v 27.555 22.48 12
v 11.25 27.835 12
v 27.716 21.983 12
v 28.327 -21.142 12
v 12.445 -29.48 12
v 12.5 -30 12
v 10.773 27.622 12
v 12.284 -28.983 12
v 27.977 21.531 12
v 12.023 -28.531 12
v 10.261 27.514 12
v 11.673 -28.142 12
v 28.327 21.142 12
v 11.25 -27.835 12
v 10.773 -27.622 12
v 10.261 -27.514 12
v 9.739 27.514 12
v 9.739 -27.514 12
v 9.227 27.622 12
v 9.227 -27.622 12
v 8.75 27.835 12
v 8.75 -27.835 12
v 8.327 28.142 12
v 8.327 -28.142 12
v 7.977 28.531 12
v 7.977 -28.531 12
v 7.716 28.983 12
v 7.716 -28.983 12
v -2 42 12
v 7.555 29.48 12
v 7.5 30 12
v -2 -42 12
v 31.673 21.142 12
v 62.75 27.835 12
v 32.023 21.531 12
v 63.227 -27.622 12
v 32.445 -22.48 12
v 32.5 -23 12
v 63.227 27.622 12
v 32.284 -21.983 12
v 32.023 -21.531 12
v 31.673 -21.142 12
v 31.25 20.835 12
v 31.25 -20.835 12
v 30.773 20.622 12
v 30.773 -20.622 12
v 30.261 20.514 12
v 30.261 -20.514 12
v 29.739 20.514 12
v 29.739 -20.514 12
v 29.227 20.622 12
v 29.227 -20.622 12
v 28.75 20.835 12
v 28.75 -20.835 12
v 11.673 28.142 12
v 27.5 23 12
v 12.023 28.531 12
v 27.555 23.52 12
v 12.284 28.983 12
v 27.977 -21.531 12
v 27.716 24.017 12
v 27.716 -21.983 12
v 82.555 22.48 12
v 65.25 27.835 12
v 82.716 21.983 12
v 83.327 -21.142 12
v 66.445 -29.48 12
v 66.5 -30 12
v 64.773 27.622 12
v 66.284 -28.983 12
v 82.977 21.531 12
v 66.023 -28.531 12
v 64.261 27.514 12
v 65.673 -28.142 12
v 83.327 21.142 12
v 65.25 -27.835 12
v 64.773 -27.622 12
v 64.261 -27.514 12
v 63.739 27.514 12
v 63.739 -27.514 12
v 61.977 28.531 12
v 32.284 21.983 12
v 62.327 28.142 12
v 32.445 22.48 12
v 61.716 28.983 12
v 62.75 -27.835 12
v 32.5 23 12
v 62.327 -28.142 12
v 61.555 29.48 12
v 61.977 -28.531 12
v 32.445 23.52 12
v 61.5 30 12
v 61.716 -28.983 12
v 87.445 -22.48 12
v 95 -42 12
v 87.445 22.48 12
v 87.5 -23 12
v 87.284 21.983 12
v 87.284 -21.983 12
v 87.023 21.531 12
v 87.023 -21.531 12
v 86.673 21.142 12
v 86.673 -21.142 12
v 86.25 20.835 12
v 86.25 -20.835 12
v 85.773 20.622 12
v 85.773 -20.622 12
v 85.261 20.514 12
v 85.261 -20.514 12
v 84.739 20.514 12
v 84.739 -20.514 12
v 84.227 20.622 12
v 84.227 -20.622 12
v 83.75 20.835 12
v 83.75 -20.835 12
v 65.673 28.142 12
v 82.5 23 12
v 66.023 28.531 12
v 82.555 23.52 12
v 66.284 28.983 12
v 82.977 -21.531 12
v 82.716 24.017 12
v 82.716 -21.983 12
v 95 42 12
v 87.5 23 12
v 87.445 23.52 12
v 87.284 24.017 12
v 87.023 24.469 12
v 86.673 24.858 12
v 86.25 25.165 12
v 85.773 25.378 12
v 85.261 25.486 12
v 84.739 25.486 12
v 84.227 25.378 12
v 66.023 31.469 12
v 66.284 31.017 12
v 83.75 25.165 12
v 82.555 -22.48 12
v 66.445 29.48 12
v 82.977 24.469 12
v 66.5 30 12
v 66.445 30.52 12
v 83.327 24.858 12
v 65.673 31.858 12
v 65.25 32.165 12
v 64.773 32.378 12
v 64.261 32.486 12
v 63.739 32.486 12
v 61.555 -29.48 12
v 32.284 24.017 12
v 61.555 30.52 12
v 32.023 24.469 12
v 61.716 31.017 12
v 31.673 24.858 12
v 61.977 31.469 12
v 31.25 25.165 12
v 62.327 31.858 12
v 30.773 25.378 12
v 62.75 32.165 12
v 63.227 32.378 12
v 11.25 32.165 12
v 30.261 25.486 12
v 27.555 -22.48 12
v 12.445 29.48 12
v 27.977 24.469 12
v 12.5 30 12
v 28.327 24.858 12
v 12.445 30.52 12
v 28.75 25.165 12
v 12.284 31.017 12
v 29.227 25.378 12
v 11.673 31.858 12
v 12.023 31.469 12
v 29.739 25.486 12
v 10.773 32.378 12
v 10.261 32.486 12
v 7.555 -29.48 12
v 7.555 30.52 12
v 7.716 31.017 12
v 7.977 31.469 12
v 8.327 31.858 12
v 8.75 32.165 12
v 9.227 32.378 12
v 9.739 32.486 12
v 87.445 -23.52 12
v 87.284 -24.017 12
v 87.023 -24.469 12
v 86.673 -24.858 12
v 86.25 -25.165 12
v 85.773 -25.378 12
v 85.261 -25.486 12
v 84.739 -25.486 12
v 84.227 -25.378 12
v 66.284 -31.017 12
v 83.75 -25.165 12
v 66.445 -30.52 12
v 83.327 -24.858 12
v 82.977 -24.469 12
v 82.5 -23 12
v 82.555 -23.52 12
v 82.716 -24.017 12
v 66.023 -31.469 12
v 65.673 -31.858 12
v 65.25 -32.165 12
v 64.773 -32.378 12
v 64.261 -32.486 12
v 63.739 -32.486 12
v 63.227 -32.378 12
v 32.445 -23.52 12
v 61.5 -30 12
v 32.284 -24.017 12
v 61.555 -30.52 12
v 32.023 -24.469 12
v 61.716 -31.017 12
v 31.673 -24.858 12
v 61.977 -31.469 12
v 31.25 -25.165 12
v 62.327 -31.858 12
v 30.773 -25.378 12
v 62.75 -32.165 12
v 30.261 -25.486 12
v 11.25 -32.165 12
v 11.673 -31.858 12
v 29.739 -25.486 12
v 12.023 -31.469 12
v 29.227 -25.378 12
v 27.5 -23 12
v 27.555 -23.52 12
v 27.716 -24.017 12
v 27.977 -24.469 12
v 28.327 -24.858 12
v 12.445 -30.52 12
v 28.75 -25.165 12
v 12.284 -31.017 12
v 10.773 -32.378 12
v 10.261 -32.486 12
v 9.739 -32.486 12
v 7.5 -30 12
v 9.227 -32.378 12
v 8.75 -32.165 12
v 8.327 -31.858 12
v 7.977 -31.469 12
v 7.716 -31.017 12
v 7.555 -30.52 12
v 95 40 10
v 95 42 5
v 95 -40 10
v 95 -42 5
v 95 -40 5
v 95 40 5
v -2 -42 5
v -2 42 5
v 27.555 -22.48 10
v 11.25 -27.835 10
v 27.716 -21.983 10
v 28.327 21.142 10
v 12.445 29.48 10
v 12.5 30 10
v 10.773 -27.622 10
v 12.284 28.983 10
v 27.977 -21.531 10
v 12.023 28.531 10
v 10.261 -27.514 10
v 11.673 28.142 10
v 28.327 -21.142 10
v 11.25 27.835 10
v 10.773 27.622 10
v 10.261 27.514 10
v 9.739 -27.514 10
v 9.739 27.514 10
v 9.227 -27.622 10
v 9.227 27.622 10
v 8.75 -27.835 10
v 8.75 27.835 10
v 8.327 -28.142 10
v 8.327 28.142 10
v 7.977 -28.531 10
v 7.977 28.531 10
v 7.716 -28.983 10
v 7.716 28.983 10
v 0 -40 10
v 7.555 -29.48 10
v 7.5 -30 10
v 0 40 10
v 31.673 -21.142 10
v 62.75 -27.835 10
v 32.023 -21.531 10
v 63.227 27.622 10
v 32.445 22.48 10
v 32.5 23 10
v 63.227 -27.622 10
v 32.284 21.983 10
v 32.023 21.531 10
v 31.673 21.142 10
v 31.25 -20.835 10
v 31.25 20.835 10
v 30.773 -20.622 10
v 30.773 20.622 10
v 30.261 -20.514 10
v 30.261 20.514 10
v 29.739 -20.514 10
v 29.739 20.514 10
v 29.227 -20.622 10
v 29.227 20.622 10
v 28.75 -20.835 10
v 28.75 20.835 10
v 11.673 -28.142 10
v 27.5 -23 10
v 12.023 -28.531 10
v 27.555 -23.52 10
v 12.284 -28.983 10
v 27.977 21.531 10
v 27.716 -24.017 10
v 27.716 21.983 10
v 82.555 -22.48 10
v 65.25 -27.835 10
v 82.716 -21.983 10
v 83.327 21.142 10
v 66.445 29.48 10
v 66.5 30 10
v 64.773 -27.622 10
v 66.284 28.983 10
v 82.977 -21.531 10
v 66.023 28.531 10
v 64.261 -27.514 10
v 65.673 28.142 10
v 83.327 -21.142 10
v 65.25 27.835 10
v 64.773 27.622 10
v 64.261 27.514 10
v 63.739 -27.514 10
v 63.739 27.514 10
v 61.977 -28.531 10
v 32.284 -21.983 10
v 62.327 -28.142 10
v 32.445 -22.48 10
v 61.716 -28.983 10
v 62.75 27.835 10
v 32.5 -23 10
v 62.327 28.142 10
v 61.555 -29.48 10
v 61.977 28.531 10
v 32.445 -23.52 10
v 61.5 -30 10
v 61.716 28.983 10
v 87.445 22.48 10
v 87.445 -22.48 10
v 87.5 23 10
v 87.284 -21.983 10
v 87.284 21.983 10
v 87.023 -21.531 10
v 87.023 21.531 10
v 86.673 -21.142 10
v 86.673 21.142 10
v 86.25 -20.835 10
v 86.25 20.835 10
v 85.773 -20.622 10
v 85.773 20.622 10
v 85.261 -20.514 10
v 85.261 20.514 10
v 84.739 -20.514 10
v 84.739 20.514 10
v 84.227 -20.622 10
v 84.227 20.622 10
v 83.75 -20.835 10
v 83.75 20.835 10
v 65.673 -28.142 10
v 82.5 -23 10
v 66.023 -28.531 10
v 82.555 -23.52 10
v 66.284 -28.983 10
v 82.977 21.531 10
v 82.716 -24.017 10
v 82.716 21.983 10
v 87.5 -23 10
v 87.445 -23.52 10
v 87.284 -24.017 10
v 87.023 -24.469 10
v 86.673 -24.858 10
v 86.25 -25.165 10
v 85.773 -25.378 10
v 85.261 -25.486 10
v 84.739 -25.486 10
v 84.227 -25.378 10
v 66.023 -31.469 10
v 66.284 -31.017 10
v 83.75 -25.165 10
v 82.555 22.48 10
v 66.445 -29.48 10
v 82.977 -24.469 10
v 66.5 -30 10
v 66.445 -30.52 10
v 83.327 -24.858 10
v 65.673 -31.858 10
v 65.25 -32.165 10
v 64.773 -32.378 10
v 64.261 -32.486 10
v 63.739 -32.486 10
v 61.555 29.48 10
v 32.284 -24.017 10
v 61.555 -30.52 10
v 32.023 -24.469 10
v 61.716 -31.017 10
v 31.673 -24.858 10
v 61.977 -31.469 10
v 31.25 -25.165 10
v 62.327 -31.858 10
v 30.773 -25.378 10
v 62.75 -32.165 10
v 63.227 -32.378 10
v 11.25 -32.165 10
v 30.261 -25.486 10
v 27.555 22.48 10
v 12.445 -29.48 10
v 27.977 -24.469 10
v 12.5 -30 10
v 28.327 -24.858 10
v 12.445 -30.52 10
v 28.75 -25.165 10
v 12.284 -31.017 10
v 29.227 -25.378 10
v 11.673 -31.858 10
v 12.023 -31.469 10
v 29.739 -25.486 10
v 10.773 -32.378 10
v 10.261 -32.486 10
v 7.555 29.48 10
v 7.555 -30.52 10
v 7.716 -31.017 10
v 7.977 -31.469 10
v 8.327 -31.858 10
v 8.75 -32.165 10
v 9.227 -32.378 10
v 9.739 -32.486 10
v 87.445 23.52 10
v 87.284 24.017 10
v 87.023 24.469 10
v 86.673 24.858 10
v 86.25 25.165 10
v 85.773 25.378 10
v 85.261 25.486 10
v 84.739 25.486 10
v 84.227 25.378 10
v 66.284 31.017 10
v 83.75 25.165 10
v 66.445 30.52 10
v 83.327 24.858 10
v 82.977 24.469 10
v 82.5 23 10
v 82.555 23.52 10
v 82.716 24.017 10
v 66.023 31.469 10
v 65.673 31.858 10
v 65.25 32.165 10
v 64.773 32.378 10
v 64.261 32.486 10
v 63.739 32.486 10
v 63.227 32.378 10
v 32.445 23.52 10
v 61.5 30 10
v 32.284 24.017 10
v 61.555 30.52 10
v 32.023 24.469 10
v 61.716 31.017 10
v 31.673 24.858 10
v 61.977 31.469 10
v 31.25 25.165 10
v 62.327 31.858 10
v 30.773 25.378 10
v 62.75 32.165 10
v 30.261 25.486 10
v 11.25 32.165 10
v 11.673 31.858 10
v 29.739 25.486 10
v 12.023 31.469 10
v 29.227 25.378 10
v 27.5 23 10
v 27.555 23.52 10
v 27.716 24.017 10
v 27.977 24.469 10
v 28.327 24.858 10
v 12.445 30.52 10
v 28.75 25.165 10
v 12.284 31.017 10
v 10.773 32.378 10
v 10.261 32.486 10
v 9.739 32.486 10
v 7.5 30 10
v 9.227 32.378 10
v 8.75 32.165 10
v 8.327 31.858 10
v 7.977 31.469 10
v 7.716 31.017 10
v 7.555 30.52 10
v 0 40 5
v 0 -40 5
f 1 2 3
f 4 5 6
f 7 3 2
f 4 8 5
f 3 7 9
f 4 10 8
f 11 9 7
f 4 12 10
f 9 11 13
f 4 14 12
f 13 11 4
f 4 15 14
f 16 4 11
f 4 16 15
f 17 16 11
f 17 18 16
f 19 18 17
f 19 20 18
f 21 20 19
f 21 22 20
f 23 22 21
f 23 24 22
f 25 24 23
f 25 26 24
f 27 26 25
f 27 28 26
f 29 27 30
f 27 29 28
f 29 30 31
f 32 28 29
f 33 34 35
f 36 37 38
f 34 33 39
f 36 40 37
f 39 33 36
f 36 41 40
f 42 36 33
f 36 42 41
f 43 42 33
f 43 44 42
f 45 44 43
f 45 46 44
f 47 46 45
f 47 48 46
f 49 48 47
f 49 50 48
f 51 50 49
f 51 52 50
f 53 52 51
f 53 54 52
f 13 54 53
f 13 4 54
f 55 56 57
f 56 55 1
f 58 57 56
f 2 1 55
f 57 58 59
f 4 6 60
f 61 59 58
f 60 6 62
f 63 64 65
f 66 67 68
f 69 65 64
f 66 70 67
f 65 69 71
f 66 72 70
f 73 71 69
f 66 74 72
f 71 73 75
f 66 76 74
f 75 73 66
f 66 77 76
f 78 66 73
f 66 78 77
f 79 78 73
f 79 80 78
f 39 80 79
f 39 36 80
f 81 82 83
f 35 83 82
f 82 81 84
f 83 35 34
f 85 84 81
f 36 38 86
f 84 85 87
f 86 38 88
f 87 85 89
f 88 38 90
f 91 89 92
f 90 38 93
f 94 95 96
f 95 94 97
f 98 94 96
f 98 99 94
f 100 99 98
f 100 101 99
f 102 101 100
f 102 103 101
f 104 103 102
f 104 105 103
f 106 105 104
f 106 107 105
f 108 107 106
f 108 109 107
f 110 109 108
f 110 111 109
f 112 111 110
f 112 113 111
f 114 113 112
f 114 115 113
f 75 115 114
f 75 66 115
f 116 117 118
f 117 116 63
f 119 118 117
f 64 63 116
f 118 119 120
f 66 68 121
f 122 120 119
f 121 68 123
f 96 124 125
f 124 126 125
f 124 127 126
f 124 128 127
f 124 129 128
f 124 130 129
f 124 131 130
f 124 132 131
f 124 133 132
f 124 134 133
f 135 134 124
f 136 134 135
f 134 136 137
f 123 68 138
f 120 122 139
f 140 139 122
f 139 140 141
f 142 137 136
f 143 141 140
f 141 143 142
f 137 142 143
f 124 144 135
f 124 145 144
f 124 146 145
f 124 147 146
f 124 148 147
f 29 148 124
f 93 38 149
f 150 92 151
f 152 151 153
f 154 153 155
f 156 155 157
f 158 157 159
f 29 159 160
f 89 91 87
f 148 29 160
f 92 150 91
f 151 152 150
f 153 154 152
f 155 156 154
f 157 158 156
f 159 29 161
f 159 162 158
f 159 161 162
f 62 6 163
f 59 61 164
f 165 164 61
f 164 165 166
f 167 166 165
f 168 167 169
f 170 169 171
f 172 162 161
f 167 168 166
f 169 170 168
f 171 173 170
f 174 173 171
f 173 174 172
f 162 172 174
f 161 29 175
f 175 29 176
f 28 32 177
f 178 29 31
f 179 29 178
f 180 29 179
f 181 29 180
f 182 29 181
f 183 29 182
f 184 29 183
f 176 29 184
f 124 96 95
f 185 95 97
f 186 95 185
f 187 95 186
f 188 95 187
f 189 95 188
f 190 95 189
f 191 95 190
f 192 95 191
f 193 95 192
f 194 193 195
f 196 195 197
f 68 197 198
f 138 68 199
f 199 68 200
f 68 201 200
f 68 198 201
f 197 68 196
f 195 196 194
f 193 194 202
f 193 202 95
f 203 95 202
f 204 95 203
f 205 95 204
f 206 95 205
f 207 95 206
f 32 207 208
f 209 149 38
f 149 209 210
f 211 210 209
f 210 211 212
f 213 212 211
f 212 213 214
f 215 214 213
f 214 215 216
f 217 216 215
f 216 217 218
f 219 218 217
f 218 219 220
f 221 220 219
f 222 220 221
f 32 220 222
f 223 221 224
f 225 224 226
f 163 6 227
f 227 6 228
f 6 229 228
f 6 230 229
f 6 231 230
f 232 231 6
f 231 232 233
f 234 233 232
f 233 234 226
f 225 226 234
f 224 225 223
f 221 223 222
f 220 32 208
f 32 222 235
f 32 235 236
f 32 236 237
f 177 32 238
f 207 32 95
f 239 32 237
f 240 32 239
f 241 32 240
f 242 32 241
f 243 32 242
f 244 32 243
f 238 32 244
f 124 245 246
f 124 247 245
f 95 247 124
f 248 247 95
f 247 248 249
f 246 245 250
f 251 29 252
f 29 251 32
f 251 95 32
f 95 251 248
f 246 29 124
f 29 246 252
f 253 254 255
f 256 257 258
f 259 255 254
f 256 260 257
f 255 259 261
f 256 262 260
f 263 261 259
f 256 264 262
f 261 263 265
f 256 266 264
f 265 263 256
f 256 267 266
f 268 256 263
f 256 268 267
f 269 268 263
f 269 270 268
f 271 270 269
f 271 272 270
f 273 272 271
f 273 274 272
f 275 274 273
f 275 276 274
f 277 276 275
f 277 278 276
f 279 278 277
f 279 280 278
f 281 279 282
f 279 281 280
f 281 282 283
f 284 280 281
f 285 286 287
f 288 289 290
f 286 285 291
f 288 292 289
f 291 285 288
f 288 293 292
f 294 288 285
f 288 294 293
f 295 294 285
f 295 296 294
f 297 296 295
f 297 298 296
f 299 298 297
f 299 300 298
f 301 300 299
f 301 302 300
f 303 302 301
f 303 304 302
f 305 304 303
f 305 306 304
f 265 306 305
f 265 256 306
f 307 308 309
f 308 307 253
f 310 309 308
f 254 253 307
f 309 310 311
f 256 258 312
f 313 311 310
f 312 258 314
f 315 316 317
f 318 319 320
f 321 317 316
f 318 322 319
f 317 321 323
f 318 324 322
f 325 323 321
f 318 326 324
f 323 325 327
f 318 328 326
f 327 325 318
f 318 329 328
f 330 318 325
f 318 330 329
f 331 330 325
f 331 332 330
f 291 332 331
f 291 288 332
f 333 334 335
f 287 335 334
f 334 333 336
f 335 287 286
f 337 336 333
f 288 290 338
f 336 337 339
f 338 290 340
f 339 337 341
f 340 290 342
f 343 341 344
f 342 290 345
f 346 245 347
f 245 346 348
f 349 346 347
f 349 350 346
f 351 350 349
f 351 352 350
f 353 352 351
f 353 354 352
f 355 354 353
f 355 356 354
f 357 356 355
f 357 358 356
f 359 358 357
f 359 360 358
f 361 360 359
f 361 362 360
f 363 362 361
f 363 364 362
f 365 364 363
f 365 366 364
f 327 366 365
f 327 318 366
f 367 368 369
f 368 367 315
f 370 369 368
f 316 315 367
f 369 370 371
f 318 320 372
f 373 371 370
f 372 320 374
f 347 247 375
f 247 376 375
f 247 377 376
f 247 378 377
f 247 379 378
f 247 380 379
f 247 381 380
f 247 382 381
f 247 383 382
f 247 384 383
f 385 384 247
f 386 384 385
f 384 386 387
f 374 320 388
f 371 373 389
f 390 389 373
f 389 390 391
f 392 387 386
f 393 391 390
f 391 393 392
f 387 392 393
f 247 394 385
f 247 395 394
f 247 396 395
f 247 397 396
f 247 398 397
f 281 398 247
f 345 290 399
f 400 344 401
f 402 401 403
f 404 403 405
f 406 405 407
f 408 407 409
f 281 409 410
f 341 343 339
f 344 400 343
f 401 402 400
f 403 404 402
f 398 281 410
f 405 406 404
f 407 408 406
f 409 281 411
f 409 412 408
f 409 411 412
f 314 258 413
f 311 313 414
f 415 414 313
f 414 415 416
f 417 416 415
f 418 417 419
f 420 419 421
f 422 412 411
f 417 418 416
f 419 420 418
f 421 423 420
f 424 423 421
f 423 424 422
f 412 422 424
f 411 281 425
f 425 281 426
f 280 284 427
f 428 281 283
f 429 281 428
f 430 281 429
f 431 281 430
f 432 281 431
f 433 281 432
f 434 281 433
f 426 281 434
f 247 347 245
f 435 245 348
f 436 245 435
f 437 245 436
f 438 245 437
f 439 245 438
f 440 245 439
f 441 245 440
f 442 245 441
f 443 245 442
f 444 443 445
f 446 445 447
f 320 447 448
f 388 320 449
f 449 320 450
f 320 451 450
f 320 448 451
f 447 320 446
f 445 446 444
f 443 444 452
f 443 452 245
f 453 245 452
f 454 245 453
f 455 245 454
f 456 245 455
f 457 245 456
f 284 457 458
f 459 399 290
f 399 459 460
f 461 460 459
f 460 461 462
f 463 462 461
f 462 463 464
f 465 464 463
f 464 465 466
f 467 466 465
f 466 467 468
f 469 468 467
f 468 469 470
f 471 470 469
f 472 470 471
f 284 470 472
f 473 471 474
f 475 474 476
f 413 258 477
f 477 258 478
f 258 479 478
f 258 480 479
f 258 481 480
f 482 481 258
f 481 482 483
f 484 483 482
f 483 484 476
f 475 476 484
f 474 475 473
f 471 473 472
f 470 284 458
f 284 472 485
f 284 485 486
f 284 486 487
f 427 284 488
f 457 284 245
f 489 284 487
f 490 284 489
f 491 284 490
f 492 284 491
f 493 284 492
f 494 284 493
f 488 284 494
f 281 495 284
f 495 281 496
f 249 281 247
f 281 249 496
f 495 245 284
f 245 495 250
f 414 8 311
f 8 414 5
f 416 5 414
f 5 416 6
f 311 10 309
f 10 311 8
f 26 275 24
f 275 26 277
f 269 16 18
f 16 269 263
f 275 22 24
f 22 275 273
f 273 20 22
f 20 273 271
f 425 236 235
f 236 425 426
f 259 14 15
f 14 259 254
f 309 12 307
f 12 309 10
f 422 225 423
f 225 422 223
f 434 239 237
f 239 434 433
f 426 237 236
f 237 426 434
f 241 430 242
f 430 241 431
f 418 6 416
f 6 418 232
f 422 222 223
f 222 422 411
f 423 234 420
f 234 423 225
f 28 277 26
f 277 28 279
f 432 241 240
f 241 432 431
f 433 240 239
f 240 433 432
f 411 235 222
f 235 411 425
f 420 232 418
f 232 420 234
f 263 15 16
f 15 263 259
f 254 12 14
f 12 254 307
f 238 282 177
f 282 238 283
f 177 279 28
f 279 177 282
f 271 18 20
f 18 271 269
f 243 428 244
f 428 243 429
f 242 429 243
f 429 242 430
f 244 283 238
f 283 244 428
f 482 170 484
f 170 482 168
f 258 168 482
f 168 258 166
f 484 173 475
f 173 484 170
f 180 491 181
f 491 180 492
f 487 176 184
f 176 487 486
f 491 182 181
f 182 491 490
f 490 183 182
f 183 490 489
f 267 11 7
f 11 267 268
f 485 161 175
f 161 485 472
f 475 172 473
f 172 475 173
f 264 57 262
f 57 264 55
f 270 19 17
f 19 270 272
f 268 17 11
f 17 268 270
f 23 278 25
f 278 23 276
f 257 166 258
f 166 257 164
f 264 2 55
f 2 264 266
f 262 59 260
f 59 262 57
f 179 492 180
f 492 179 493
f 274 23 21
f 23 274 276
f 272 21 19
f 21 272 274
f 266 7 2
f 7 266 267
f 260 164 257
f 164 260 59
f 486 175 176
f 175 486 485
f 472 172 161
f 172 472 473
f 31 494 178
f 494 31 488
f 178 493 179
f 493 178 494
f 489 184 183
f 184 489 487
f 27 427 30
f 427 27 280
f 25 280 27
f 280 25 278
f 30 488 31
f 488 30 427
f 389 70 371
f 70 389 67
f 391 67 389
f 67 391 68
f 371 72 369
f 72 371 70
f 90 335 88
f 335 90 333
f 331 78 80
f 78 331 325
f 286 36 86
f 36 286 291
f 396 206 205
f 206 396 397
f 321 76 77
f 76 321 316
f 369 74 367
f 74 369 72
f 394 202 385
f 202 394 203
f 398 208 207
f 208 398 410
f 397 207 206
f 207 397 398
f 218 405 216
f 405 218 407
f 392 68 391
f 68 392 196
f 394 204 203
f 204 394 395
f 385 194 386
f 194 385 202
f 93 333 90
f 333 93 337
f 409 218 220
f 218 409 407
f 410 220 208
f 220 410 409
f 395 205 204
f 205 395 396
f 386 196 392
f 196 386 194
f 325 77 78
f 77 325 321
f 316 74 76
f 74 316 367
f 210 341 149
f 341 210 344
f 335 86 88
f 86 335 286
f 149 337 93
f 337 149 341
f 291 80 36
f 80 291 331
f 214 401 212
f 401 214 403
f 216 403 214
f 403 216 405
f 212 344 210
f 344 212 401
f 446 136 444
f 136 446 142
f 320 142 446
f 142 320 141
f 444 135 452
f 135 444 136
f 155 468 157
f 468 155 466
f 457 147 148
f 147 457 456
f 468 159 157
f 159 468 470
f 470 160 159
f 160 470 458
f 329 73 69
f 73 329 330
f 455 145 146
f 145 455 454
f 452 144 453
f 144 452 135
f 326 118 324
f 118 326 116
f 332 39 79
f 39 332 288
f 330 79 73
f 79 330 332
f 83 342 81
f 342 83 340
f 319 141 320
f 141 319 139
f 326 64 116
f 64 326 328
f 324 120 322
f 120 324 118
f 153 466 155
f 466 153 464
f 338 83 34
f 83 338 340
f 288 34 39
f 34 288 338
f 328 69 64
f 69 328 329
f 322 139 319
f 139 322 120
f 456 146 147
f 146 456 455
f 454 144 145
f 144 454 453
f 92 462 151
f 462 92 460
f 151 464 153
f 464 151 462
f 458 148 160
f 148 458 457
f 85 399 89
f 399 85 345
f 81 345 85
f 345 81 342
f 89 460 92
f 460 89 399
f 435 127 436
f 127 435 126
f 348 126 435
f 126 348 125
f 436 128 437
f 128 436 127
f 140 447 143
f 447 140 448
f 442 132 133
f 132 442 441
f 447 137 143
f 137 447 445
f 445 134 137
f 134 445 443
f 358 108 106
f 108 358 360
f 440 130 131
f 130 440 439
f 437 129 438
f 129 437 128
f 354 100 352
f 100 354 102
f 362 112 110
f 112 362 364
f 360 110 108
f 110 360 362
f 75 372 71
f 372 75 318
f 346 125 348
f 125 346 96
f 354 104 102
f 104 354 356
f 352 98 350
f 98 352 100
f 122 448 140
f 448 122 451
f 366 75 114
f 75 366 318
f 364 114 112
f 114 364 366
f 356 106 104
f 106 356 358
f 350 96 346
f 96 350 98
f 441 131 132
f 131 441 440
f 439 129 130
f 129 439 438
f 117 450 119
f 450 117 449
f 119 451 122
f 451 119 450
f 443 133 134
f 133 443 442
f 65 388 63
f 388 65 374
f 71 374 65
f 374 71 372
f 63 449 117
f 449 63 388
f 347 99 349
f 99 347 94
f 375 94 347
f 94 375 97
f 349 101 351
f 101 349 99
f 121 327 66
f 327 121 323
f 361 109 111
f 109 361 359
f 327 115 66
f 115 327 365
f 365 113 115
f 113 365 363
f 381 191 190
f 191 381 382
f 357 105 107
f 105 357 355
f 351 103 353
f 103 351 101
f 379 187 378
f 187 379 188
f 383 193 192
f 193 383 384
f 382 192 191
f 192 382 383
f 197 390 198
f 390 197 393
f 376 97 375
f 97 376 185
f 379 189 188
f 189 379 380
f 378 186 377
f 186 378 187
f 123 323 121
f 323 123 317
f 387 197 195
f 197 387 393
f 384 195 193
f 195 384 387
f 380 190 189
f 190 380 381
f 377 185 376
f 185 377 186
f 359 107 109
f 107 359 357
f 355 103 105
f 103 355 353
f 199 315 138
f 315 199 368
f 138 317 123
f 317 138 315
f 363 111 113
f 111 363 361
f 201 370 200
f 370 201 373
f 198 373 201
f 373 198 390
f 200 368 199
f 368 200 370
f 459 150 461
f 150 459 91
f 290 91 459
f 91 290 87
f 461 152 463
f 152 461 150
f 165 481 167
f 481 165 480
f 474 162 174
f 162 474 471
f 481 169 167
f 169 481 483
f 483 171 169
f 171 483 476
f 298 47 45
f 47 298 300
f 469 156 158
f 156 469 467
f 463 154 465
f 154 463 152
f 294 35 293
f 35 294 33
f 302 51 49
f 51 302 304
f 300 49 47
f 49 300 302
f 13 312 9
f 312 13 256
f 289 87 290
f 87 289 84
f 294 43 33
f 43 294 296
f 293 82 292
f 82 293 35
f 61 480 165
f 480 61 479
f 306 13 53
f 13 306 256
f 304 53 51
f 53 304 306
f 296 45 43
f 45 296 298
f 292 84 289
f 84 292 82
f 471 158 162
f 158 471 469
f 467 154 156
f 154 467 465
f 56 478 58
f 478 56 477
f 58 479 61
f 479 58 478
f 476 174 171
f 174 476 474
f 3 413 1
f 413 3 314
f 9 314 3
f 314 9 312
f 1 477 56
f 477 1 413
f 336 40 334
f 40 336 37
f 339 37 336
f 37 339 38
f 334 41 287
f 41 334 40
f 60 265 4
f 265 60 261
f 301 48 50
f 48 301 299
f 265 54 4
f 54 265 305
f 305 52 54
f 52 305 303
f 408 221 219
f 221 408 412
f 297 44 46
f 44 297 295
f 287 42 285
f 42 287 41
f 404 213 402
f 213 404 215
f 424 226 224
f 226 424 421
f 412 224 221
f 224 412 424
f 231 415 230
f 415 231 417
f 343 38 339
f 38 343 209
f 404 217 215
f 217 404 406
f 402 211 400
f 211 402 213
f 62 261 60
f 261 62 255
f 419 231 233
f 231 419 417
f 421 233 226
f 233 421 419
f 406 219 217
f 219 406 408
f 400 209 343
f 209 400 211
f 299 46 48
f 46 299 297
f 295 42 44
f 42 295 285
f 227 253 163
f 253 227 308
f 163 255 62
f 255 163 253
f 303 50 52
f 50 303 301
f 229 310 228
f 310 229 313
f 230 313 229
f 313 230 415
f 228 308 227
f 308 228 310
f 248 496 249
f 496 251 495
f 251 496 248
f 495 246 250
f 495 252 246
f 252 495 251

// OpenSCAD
// file: ubolt.scad
inch = 25.4;

d = 6;
D = 40 + 6;
H = 90;

module alex_2080(h){
  color("silver")scale([20, 80, h])import("/home/justin/code/Alex/part_libraries/Main/STL/2080 Alex.stl");
}

module ubolt(D, H, d){
  hh = H - d/2 - D/2;
  color("silver"){
    rotate([90, 0, 0])rotate_extrude(angle=180, $fa=1){
      translate([D/2, 0, 0])circle(d=d+1, $fn=180);
    }

    translate([D/2, 0, -hh])cylinder(d=6+1, h=hh, $fn=180);
    translate([-D/2, 0, -hh])cylinder(d=6+1, h=hh, $fn=180);
  }
}

module bb(){
  black = .2;
  hh = 12.8-2-2.4;
  
  rotate([90, 0, 0]){
    color("silver")cylinder(d=38, h=74, center=true, $fn=180);
    
    color([black, black, black])translate([0, 0, -74/2-10])cylinder(d=44, h=10-2, $fn=180);
    color([black, black, black])translate([0, 0, -74/2-2])cylinder(d2=38, d1=44, h=2, $fn=180);

    color([black, black, black])translate([0, 0, 74/2])cylinder(d=40, h=2.4, $fn=180);
    color([black, black, black])translate([0, 0, 74/2+2.4])cylinder(d1=40, d2=44, h=2, $fn=180);
    color([black, black, black])translate([0, 0, 74/2+2 + 2.4])cylinder(d=44, h=hh, $fn=180);
  }
}


module negative_space(){
  bb();
  translate([0, 0, -2]){
    translate([0, 30, 0])ubolt(D, H, d);
    translate([0, -30, 0])ubolt(D, H, d);
    translate([0, 0, -44]){
      color("silver")rotate([0, 90, 90])translate([-10, 0, -94/2+10])alex_2080(94);
      //translate([0, 0, (20+inch/2)/2])color([.1, .1, .1])cube([80, 74, inch/2], center=true);
    }
  }
}
module positive_space(){
  rotate([90, 0, 0])cylinder(d=46, h=12, $fn=50, center=true);
  translate([0, -0, -25/2])cube([56, 12, 25],center=true);
}

module block(){
  difference(){
    translate([0, 30, 0])positive_space();
    negative_space();
    //translate([0, 0, -500])cube(1000);
    translate([-500, 0, 0])cube(1000);
  }
}
//negative_space();
block();
/*
translate([0, -60, 0])block();

translate([0, 74/2+10, 0])rotate([-90, 0, 0]){
  color("purple")import("/home/justin/code/ThirdWheel/Fabricate/stl/bb_washer.stl");
  color([.2, .2, .2])translate([0, 0, 12])cylinder(d=22, h=4);
}
			  
//alex_2080(100);

*/
// main file
use<ubolt.scad>;
t = 2;
base_dims = [20.0, 80.0, 95.0];
module alex(l){
  color("silver")
    scale([20, 80, l])import("/home/justin/code/Alex/part_libraries/Main/STL/2080 Alex.stl");
}

module bb_panel(){
  alex(base_dims[2]);
}



module base(){
  rotate([180, 0, 0])rotate([0, 90, 0])translate([-base_dims[0]/2+t, -base_dims[1]/2-t, -t])
    difference(){
    cube([base_dims[0], base_dims[1] + 2 * t, base_dims[2] + t]);
    translate([-t, t, t])cube([base_dims[0], base_dims[1], base_dims[2] + 1]);
  }
}
module center_punch_old(){
  translate([0, 0, -.3])cylinder(d1=0, d2=4.3, h=3, $fn=50);
  intersection(){
    cylinder(d1=0, d2=11, h=41, $fn=50);
    cylinder(d=11, h=41, $fn=6);
  }
  translate([0, 0, 41])cylinder(d=11, h=70, $fn=6);
}
module center_punch(d){
translate([0, 0, 5])cylinder(d1=d, d2=d, h=5, $fn=30);
}

hh = 7.6/2;
sep = 54;
d = 6; 
D = 40 + 6;
H = 90;
holes = [
	 [10, -30, hh],
	 //[10, -10, hh],
	 //[10,  10, hh],
	 [10,  30, hh],
	 [10+sep, -30, hh],
	 //[10+sep, -10, hh],
	 //[10+sep,  10, hh],
	 [10+sep,  30, hh],
	 [base_dims[2]-10, D/2, hh],
	 [base_dims[2]-10, -D/2, hh],
	 [base_dims[2]-5-60, D/2, hh],
	 [base_dims[2]-5-60, -D/2, hh]
	 ];
difference(){
  base();
  for(center = holes){
    #translate(center)center_punch(5);
  }
  #translate([0, 0, -5])cube([200, 200, 20], center=true);
}
//rotate([0, 90, 0])bb_panel();
//#translate([base_dims[2]-10, 0, D])rotate([0, 0, 90])ubolt(D, H, d);
//#translate([base_dims[2]-10-60, 0, D])rotate([0, 0, 90])ubolt(D, H, d);
//translate([10, 0, 10])alex(100);
//rotate([0, 90, 0])alex(base_dims[2]);
